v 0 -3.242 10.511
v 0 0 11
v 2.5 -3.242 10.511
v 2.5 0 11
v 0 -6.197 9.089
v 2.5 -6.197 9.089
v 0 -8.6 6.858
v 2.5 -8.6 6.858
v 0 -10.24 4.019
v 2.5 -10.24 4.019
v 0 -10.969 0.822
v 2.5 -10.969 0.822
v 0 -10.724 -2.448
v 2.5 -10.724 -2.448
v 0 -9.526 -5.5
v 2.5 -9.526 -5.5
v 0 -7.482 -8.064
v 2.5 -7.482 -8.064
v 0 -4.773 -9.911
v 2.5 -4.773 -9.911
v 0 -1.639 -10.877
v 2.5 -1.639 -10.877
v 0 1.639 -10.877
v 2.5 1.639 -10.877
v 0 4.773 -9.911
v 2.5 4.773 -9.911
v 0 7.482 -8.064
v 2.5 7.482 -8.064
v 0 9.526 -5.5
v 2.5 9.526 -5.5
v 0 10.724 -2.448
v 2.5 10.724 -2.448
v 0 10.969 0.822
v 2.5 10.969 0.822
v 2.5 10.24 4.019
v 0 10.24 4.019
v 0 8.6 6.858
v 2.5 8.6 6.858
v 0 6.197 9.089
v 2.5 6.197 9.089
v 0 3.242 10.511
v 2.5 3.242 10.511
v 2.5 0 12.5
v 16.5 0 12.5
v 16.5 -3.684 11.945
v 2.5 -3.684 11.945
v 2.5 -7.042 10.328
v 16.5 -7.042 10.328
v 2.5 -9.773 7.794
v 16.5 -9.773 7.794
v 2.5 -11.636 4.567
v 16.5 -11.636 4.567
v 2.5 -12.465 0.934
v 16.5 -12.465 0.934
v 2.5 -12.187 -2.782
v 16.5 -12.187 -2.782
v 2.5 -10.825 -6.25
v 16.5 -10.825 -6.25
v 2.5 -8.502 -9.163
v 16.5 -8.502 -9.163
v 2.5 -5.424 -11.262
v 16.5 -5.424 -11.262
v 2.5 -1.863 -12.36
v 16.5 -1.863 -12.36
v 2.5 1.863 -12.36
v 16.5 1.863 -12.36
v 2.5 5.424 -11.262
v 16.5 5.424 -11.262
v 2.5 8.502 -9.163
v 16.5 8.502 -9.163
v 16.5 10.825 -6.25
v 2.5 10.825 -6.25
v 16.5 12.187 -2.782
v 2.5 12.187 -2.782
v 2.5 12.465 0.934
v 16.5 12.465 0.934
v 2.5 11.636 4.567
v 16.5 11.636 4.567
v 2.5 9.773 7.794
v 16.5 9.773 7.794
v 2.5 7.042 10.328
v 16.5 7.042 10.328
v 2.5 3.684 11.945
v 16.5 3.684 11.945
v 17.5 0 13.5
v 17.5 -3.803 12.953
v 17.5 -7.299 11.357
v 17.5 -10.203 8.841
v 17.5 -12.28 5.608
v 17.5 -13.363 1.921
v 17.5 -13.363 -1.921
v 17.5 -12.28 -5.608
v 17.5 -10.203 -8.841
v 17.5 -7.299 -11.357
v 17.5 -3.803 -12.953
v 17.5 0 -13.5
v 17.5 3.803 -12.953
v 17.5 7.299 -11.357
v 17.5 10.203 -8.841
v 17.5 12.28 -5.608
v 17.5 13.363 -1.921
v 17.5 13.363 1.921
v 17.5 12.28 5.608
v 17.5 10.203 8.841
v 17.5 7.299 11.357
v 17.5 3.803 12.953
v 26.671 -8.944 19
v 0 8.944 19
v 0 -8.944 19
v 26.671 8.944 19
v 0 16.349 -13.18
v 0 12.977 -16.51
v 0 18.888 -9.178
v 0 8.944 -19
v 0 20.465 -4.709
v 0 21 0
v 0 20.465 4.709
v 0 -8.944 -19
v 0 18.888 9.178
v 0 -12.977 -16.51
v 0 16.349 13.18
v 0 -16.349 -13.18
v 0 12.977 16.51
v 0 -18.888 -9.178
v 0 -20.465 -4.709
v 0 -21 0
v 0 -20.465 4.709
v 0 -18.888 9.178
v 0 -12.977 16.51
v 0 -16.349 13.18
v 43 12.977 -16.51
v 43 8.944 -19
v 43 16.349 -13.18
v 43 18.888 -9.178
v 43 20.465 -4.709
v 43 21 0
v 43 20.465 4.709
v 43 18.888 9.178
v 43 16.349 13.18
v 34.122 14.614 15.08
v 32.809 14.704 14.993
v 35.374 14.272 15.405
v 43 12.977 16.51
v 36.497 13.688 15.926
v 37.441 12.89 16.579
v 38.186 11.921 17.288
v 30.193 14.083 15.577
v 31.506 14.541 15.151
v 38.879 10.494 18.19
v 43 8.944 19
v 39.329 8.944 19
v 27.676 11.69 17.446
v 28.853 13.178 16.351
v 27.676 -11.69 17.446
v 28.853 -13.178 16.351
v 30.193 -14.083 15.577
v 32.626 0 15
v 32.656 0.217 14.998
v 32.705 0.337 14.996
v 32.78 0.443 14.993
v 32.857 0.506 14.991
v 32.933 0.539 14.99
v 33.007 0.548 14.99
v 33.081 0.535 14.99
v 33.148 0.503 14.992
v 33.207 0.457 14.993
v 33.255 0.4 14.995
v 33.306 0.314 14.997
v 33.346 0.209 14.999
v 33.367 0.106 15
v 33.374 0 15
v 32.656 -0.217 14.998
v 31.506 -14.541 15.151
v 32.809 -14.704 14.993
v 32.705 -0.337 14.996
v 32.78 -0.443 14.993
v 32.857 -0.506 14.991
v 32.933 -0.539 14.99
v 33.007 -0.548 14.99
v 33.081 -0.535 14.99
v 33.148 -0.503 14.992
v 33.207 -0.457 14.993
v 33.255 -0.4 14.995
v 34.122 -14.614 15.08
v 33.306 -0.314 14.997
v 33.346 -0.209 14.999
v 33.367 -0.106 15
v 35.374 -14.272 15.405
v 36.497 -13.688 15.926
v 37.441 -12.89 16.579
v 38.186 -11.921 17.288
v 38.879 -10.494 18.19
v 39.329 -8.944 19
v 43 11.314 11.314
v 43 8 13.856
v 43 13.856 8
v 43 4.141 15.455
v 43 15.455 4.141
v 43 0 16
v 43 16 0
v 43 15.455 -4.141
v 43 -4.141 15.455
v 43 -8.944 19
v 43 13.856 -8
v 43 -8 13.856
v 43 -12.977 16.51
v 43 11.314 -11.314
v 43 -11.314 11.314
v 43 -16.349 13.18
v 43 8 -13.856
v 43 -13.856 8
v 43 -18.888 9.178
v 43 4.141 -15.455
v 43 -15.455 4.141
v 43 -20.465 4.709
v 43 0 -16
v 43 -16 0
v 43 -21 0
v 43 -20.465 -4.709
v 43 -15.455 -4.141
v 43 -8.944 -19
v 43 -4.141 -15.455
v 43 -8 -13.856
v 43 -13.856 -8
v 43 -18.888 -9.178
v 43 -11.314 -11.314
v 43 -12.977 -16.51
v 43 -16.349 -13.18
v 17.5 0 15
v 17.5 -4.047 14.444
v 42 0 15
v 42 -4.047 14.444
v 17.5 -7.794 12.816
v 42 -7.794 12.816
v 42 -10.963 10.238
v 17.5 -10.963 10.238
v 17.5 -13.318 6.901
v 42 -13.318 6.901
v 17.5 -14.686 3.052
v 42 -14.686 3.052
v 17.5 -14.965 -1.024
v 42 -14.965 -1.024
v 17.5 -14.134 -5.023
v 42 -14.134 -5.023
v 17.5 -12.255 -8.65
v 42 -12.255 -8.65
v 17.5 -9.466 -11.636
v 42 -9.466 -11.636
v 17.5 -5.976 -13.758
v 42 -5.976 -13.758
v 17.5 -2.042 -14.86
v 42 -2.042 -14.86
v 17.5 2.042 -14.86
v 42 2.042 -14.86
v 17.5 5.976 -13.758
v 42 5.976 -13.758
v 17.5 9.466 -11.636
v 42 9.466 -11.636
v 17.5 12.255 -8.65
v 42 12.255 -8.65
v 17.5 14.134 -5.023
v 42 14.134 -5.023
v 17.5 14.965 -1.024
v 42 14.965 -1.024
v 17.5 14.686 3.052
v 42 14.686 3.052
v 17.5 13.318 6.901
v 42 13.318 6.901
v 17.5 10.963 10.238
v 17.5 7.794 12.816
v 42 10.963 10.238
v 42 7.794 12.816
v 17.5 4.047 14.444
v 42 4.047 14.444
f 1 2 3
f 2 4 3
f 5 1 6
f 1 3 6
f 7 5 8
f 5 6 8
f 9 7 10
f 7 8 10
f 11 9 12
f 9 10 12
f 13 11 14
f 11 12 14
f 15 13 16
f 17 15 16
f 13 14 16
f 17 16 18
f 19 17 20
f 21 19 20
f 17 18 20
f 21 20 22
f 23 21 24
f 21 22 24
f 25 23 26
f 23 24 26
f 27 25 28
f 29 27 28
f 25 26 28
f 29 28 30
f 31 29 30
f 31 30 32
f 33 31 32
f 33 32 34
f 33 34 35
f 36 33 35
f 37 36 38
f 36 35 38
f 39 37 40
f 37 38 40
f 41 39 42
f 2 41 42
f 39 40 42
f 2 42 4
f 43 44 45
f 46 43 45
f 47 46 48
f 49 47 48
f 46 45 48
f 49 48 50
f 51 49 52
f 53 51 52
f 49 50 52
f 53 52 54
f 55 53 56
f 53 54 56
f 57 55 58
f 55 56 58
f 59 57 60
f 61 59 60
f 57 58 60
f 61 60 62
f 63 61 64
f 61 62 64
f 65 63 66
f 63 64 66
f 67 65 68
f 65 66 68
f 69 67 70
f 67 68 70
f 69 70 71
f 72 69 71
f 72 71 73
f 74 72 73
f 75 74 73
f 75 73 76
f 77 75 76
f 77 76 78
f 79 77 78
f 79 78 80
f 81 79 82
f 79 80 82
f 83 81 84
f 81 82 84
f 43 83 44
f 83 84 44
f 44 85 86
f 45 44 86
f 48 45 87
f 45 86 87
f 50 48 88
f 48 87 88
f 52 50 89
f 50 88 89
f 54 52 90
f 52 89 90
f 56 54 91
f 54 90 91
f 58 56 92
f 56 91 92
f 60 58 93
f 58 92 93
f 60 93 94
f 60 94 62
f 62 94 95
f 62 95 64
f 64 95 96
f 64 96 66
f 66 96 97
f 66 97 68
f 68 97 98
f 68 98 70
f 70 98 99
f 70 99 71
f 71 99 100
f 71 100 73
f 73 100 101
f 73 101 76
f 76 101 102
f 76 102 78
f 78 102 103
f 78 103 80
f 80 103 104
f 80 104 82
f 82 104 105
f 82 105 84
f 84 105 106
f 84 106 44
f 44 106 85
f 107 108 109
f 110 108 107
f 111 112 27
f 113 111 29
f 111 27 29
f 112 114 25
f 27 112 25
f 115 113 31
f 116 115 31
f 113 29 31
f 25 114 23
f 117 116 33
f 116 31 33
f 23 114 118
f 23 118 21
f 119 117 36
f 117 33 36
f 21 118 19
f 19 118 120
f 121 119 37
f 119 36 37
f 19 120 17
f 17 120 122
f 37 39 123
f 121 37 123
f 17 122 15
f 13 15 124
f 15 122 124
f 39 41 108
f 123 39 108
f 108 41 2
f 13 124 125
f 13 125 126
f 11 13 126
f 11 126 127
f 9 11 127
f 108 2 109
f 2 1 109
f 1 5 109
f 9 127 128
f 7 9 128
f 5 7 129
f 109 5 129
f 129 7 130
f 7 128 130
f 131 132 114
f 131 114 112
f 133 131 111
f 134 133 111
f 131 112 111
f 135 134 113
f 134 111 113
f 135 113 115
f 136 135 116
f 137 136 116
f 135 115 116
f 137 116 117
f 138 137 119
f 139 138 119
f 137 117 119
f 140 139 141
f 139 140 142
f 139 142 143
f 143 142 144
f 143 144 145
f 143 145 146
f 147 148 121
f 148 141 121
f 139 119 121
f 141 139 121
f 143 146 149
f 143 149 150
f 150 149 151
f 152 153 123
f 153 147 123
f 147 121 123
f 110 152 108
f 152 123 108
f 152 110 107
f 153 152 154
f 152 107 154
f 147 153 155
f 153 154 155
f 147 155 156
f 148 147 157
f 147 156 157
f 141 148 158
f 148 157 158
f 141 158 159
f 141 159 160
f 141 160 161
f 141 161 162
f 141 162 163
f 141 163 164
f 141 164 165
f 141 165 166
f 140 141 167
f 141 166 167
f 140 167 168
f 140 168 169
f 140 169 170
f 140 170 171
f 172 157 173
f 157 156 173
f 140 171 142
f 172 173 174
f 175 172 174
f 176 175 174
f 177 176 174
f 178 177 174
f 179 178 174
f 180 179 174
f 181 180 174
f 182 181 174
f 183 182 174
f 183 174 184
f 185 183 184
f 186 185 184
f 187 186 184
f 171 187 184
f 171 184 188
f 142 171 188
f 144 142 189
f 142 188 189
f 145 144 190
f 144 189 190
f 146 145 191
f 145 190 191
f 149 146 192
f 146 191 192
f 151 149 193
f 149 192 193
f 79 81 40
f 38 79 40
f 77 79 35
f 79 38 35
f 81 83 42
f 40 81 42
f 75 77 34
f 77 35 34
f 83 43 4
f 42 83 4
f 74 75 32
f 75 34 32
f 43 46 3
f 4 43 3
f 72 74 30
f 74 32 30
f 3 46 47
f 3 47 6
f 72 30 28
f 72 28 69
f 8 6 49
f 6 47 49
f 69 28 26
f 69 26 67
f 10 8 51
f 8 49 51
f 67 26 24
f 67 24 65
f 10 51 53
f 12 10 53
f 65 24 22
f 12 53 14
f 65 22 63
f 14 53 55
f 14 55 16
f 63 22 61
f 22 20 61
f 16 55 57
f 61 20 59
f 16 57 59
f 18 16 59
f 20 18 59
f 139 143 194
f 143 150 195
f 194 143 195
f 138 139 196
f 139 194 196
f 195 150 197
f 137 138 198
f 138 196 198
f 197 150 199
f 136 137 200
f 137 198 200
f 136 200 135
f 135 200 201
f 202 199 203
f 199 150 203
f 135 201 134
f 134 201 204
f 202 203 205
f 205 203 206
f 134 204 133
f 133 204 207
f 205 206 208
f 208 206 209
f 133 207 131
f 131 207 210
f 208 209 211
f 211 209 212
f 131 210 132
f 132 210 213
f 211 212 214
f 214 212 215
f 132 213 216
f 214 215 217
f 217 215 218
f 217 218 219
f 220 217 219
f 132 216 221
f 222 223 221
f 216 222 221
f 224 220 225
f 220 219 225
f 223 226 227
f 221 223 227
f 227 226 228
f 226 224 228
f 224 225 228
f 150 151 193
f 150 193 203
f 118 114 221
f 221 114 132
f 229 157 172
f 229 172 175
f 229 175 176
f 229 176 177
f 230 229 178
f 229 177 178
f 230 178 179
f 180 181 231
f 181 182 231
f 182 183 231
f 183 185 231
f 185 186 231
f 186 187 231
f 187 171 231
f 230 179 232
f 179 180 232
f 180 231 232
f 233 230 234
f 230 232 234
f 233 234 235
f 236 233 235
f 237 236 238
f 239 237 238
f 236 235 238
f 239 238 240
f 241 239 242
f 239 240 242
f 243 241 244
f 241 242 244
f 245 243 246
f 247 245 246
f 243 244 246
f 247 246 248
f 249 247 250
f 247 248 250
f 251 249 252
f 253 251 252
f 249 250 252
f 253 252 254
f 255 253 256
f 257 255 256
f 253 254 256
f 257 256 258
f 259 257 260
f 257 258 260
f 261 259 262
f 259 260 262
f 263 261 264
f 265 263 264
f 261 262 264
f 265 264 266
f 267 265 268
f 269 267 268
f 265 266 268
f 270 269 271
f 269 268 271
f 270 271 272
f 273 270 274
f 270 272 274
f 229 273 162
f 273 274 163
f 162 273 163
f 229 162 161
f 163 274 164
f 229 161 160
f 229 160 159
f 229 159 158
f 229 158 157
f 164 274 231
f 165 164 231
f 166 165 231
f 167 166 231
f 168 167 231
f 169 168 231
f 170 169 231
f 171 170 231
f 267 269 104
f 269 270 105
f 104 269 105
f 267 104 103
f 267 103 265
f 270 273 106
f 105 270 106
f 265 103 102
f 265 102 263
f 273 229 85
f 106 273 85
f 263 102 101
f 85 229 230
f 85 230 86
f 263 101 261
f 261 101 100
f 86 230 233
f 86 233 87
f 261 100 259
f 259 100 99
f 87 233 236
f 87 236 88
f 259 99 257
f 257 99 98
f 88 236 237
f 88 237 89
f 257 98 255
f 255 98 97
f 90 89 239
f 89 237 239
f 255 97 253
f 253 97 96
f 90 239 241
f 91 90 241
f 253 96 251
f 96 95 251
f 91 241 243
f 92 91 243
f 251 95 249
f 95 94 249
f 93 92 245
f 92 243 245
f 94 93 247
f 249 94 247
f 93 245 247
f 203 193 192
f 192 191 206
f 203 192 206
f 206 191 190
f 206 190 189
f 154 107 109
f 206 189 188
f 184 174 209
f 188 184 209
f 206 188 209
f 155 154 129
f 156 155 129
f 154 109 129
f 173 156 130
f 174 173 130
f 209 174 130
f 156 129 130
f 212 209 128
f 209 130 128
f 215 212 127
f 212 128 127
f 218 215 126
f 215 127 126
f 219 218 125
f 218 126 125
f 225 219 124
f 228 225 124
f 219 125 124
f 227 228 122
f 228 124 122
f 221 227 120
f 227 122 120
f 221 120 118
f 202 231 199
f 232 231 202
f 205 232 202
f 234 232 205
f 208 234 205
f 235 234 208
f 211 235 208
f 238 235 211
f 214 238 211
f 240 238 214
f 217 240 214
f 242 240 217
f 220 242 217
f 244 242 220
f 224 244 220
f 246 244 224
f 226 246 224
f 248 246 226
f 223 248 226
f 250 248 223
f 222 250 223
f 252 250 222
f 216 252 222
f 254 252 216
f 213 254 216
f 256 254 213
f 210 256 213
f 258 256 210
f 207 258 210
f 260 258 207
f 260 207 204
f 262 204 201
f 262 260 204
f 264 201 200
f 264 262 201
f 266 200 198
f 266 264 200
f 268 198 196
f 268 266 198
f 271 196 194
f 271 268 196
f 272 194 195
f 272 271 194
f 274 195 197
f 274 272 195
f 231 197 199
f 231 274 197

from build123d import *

# Parameters (mm, degrees)
F4_SIZE       = 1
F5_W          = 43
F5_H          = 3
F6_DEPTH      = 21.001
F6_DEPTH_BACK = 21.001
F7_R          = 7
F8_DEPTH      = 71.001


with BuildPart() as f1:
    # F0 (on Front) → F1 (revolve)
    with BuildSketch(Plane.XZ):
        Polygon((43, 15), (43, 21), (0, 21), (0, 11), (2.5, 11), (2.5, 12.5), (17.5, 12.5), (17.5, 15), align=None)
    revolve(axis=Axis((10.041691, 0, 0), (1, 0, 0)))

    # F4
    f4_edges = [f1.edges().sort_by_distance(p)[0] for p in [
        (43, 0, -15),
        (17.5, 0, -12.5),
    ]]
    chamfer(f4_edges, length=F4_SIZE)

    # F5 (on Front) → F6 (cut, two sides)
    with BuildSketch(Plane.XZ) as f6_sk:
        with Locations((21.5, 20.5)):
            Rectangle(F5_W, F5_H)
        with Locations((21.5, -20.5)):
            Rectangle(F5_W, F5_H)
    extrude(amount=F6_DEPTH, mode=Mode.SUBTRACT)
    extrude(f6_sk.sketch, amount=-F6_DEPTH_BACK, mode=Mode.SUBTRACT)

    # F7 (on offset) → F8 (cut, through all)
    with BuildSketch(Plane.XZ.offset(50)):
        with Locations((33, 21.99)):
            Circle(F7_R)
    extrude(amount=-F8_DEPTH, mode=Mode.SUBTRACT)


solid = f1.part
